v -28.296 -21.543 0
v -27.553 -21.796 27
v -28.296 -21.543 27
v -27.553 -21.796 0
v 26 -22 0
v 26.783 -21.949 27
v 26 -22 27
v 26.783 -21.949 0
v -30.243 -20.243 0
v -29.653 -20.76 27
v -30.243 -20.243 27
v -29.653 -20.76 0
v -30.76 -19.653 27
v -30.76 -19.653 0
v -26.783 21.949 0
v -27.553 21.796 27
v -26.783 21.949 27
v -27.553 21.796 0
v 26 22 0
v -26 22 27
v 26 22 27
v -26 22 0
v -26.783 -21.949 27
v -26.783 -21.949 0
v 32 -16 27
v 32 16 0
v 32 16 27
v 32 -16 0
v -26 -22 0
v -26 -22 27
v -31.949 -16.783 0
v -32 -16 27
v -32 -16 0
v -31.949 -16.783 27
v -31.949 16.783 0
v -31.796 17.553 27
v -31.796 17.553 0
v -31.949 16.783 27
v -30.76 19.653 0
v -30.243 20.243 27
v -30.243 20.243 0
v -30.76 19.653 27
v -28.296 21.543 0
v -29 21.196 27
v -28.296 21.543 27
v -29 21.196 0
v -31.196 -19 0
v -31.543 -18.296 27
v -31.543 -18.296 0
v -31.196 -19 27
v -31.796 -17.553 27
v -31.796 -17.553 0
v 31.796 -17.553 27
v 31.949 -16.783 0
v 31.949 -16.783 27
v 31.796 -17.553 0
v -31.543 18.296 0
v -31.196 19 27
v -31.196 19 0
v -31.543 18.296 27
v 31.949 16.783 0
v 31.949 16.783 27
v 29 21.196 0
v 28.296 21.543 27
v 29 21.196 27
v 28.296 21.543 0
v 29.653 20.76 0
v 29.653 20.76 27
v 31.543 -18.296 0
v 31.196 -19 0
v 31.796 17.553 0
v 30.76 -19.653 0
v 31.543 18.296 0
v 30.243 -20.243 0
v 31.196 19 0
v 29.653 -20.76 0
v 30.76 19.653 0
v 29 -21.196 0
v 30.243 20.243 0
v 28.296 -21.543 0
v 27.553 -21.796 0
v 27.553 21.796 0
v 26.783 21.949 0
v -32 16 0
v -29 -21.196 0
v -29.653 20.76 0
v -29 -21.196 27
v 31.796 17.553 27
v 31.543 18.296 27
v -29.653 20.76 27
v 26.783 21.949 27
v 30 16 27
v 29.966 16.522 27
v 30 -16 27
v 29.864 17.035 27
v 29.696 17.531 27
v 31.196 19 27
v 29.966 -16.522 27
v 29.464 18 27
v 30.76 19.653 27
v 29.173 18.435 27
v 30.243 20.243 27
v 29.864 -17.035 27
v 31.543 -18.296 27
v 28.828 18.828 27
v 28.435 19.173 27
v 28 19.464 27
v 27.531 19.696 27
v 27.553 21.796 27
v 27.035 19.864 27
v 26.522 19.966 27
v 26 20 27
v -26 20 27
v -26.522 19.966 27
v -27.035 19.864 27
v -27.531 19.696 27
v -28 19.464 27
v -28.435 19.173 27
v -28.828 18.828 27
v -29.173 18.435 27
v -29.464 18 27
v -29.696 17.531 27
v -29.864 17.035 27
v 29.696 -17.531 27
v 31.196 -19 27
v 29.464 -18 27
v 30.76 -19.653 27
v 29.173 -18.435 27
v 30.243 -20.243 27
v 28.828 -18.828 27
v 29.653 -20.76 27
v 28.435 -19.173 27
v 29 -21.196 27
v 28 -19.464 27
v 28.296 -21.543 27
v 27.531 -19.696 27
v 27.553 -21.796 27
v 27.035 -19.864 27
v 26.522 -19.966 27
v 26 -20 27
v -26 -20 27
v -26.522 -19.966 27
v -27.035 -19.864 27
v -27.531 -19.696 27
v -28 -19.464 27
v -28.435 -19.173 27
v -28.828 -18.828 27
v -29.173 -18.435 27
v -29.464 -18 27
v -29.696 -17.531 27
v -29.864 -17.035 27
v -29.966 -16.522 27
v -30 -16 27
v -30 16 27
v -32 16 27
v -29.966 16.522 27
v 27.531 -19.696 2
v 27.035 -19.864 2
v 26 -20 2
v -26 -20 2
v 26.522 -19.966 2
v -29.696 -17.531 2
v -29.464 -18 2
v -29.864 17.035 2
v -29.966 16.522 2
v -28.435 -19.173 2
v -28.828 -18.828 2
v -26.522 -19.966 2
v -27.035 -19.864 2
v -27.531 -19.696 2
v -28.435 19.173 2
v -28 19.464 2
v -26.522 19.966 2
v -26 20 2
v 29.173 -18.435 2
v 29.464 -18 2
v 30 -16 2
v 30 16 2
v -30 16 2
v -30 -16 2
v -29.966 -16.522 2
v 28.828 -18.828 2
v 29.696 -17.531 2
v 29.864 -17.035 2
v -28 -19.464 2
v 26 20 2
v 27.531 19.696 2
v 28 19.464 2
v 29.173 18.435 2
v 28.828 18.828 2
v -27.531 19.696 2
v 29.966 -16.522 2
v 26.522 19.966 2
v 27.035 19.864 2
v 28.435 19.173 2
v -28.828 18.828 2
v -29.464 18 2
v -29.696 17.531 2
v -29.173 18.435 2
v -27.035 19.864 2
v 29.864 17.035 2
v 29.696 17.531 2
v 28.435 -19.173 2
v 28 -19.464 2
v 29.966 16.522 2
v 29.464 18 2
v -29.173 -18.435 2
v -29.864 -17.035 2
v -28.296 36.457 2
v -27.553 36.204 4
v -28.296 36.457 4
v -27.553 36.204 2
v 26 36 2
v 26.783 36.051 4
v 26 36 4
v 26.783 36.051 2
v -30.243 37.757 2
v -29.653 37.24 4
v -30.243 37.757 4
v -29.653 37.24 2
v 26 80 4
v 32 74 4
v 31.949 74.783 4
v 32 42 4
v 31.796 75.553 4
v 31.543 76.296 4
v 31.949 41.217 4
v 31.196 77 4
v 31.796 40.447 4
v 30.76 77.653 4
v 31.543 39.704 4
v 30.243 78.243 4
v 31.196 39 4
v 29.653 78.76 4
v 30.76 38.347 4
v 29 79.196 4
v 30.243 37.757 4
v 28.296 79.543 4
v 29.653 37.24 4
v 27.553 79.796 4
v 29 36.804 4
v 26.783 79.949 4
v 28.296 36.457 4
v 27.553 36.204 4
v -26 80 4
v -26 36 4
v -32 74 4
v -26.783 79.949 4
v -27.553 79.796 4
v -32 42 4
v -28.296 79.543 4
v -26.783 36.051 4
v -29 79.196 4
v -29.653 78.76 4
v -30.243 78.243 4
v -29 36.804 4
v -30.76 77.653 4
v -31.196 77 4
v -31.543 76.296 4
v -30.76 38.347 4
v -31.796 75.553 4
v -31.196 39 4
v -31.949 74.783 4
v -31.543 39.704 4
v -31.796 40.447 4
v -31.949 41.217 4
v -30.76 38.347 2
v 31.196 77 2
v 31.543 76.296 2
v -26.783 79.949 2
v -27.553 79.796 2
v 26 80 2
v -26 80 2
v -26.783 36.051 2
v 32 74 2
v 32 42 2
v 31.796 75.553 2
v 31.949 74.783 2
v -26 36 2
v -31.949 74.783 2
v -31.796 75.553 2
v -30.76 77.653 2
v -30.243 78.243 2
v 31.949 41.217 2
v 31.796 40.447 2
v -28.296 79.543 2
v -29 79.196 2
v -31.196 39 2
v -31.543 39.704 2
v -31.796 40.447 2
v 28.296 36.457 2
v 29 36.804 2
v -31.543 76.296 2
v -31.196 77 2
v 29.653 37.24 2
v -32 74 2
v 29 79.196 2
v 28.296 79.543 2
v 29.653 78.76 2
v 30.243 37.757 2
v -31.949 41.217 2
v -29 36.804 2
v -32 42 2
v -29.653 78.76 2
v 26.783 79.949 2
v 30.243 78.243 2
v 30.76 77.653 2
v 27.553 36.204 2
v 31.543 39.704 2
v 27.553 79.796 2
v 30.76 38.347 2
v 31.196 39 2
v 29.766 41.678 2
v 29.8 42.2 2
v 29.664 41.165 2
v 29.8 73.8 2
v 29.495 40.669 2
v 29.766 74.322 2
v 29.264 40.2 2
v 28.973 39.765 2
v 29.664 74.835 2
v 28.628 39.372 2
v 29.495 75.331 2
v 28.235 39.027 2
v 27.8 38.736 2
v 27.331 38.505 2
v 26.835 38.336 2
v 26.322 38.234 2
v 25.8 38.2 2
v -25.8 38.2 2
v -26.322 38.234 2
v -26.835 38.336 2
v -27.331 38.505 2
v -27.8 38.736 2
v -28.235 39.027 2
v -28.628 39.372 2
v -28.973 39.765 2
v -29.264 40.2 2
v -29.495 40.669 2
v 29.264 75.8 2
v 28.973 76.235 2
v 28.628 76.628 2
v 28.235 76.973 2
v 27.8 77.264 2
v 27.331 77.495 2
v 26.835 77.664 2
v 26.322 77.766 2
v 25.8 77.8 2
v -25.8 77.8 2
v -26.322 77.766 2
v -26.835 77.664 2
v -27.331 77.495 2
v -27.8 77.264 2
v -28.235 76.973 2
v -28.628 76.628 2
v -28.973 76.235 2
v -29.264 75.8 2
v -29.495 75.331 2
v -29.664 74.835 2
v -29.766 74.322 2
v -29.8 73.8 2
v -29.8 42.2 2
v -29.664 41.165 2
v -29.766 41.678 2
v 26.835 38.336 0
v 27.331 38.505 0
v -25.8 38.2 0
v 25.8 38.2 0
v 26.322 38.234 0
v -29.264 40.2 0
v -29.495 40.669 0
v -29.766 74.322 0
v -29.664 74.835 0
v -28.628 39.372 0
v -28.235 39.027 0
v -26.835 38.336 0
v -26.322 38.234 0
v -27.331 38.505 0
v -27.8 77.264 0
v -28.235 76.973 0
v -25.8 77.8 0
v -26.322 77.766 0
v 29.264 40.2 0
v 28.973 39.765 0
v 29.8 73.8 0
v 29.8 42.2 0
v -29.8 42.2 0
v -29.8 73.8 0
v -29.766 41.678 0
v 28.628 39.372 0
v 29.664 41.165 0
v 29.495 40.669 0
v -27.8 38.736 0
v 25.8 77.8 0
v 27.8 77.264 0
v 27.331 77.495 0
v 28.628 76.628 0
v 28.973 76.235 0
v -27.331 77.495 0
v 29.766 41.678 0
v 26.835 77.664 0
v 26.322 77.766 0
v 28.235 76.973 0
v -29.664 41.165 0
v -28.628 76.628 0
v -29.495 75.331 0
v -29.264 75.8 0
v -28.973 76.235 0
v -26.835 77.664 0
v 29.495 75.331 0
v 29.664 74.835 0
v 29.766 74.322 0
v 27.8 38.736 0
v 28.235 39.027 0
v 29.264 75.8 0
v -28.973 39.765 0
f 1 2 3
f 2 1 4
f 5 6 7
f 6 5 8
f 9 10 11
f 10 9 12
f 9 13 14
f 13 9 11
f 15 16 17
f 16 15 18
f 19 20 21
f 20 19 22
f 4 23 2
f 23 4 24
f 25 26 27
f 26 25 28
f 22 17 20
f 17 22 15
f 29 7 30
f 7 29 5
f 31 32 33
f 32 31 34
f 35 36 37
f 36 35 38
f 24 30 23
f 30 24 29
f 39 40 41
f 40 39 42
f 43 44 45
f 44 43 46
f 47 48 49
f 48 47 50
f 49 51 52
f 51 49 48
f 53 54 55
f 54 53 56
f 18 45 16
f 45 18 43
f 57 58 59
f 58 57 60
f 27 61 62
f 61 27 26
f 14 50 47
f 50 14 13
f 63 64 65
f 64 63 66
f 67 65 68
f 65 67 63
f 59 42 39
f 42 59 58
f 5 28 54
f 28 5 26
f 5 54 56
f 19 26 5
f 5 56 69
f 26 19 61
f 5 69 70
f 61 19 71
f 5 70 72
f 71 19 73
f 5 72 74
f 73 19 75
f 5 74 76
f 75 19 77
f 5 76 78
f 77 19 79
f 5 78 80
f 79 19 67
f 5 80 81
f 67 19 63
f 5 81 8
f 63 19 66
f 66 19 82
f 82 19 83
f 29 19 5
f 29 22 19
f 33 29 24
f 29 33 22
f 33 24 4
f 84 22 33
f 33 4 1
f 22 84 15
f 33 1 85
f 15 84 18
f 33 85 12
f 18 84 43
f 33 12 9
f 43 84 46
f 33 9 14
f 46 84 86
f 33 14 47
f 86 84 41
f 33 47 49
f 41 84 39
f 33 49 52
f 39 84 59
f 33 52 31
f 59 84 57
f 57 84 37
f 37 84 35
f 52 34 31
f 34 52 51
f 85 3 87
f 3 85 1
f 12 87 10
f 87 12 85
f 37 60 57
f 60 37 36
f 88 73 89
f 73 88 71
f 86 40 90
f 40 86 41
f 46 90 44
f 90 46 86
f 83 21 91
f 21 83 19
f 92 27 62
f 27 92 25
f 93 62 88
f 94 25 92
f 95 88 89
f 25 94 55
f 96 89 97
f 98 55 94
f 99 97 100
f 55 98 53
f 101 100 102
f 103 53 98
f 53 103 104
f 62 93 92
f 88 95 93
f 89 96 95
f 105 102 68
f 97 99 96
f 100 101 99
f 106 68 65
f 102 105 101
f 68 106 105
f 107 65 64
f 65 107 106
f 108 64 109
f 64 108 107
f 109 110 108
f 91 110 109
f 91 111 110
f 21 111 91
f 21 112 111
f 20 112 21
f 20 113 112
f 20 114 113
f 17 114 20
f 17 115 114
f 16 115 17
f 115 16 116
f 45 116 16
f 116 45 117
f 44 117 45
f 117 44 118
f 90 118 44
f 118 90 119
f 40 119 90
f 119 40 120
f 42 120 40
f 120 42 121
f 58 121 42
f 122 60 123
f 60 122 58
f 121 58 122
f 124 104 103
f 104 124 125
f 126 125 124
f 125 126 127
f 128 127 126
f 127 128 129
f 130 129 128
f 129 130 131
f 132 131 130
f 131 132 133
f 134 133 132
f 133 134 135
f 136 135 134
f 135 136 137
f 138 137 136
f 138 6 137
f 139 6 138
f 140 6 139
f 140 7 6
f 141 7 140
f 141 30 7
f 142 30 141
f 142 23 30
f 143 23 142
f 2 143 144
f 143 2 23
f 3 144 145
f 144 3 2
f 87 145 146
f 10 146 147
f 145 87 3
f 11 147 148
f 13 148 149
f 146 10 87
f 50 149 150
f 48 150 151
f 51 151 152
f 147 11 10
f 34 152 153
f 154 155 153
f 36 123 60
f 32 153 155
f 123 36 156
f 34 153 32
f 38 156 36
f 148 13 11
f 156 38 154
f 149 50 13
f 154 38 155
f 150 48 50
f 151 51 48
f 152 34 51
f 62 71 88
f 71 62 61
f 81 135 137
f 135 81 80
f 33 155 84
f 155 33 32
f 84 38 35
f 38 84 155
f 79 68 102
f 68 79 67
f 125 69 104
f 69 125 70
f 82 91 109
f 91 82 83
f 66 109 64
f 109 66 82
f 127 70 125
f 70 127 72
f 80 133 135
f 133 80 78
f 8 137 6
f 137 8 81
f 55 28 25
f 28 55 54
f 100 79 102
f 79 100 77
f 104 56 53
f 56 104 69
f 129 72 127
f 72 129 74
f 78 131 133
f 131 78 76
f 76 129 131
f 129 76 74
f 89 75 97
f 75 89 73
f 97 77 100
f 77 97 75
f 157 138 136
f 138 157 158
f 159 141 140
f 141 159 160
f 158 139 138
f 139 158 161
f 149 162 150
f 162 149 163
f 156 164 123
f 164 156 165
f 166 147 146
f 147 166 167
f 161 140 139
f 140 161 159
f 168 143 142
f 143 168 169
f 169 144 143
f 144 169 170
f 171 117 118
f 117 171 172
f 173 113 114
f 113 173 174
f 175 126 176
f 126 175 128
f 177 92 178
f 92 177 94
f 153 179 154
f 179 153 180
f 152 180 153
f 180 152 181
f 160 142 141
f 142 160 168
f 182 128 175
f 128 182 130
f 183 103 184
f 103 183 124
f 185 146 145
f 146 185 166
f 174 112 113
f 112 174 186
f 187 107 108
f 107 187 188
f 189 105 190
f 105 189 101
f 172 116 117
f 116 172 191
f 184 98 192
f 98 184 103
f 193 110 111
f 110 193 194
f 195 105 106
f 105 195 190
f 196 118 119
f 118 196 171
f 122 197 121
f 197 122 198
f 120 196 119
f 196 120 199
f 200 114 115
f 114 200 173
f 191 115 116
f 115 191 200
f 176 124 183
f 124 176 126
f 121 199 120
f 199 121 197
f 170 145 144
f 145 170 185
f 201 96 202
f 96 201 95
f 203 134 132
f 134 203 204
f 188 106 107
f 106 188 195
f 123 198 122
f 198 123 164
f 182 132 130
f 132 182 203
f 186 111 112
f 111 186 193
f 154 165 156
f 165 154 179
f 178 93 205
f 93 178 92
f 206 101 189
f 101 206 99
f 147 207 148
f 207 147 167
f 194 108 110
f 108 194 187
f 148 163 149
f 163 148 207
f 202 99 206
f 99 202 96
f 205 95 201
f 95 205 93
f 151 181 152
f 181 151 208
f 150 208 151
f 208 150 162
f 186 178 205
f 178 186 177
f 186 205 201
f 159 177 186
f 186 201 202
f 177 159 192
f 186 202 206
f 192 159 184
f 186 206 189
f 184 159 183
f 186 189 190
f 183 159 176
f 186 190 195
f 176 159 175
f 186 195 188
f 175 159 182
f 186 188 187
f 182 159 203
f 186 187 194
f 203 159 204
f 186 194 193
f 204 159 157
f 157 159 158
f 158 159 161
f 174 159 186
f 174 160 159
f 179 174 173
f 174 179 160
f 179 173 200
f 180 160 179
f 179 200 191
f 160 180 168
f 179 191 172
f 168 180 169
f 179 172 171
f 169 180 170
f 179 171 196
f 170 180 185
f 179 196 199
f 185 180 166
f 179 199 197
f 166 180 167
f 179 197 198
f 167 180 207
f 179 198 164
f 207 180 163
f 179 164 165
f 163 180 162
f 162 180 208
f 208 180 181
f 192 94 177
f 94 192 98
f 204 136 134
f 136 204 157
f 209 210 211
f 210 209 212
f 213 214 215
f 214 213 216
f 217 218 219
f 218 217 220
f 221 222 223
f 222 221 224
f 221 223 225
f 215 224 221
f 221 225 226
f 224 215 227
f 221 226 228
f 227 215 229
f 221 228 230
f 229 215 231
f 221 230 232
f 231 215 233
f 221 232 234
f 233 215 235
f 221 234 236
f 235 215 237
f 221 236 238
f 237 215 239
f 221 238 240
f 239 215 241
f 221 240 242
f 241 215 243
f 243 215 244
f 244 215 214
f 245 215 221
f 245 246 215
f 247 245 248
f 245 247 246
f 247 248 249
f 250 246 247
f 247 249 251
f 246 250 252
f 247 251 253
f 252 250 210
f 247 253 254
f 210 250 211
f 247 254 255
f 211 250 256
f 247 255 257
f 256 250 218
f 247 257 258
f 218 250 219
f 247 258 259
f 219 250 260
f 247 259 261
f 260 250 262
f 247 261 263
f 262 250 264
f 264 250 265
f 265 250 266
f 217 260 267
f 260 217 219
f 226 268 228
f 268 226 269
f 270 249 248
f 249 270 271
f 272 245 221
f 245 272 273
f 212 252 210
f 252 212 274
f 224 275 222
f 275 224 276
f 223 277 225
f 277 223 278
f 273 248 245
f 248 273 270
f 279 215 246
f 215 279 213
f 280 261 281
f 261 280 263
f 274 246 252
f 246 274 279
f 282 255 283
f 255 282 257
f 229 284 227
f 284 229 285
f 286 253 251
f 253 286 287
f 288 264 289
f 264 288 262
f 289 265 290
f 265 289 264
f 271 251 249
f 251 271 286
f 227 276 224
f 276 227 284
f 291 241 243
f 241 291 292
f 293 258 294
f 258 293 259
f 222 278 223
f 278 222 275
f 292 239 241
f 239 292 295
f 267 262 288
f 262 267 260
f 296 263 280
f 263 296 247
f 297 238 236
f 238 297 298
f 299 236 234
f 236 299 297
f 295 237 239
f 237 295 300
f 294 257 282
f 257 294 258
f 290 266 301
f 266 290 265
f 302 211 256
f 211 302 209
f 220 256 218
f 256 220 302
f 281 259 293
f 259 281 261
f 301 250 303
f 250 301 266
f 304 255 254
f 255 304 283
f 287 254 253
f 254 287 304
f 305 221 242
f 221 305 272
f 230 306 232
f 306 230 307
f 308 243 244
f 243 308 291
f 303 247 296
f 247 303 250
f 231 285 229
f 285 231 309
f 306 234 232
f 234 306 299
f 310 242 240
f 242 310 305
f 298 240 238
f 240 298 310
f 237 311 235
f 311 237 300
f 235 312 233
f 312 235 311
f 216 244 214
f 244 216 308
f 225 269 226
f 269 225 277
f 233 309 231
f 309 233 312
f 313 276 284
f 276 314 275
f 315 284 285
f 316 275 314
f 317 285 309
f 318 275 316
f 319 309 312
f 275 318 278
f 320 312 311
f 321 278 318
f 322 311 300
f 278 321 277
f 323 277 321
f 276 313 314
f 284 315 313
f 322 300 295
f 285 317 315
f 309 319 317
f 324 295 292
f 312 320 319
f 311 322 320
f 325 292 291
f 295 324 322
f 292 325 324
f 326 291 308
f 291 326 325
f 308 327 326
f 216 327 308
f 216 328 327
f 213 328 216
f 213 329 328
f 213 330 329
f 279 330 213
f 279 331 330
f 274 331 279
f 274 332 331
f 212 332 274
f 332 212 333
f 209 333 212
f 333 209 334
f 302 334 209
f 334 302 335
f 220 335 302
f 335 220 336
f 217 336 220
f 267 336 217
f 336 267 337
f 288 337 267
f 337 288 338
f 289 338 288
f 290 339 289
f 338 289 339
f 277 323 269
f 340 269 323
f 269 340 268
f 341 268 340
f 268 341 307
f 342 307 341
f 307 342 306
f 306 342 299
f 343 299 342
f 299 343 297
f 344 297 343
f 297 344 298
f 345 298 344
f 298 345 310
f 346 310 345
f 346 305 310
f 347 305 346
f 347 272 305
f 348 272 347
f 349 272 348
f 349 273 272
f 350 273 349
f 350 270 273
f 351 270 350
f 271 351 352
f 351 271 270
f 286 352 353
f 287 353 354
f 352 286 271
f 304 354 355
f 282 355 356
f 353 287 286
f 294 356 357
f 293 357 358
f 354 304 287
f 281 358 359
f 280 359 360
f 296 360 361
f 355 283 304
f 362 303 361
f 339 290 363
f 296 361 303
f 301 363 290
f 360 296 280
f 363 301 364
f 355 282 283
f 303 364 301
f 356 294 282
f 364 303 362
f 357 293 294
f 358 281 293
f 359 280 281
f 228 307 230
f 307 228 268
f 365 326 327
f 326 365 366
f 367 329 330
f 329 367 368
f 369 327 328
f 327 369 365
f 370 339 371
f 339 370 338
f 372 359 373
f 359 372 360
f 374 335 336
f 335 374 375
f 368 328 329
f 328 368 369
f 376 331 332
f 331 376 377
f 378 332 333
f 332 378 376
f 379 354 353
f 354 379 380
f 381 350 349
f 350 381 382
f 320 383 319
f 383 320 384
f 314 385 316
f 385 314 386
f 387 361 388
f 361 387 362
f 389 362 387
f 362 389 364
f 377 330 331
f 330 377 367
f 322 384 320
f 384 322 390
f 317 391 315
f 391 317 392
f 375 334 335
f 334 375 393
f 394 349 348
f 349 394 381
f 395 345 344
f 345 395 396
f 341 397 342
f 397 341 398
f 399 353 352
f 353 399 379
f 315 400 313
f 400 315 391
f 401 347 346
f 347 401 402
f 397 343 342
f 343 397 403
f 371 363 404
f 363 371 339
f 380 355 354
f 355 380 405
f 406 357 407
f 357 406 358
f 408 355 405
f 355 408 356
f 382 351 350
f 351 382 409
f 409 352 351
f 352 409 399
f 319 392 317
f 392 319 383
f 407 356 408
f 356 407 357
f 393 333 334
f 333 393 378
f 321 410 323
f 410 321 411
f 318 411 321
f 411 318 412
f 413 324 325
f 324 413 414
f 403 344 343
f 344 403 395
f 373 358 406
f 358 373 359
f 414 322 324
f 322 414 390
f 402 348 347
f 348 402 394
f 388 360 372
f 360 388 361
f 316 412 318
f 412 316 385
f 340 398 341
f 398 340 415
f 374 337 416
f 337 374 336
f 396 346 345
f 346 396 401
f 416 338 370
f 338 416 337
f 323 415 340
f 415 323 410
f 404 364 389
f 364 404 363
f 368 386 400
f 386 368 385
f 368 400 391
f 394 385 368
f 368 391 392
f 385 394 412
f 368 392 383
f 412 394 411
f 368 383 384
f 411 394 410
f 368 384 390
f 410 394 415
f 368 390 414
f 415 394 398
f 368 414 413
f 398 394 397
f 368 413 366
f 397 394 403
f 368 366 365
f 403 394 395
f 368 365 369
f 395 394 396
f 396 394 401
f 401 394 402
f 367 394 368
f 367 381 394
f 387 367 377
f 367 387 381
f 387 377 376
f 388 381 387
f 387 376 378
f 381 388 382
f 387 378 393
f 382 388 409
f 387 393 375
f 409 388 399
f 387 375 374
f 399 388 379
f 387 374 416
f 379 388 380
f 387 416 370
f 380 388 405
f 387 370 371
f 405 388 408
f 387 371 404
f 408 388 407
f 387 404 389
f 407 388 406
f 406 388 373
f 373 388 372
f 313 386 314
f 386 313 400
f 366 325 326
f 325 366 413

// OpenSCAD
// A parametric project box with a lid — the kind of thing OpenSCAD is used for.
// Renders in stock OpenSCAD unchanged.

/* [Box] */
// Internal width
width = 60;      // [20:120]
// Internal depth
depth = 40;      // [20:120]
// Internal height
height = 25;     // [10:80]
// Wall thickness
wall = 2;        // [1:0.5:5]
// Corner radius
corner = 4;      // [0:0.5:12]

/* [Lid] */
show_lid = true;
// Clearance between lid and box
clearance = 0.2; // [0:0.05:1]

/* [Quality] */
$fn = 48;

module rounded_slab(size, r) {
  // linear_extrude of an offset square is cheaper than hulling spheres and
  // keeps the vertical walls perfectly straight.
  linear_extrude(height = size[2])
    offset(r = r)
      square([size[0] - 2 * r, size[1] - 2 * r], center = true);
}

module box() {
  difference() {
    rounded_slab([width + 2 * wall, depth + 2 * wall, height + wall], corner + wall);
    translate([0, 0, wall]) rounded_slab([width, depth, height + 1], corner);
  }
}

module lid() {
  union() {
    rounded_slab([width + 2 * wall, depth + 2 * wall, wall], corner + wall);
    // Lip that drops into the box.
    translate([0, 0, -wall])
      rounded_slab([width - clearance * 2, depth - clearance * 2, wall], corner);
  }
}

box();

if (show_lid) {
  translate([0, depth + 4 * wall + 10, wall]) lid();
}

echo("outer size", width + 2 * wall, depth + 2 * wall, height + wall);
